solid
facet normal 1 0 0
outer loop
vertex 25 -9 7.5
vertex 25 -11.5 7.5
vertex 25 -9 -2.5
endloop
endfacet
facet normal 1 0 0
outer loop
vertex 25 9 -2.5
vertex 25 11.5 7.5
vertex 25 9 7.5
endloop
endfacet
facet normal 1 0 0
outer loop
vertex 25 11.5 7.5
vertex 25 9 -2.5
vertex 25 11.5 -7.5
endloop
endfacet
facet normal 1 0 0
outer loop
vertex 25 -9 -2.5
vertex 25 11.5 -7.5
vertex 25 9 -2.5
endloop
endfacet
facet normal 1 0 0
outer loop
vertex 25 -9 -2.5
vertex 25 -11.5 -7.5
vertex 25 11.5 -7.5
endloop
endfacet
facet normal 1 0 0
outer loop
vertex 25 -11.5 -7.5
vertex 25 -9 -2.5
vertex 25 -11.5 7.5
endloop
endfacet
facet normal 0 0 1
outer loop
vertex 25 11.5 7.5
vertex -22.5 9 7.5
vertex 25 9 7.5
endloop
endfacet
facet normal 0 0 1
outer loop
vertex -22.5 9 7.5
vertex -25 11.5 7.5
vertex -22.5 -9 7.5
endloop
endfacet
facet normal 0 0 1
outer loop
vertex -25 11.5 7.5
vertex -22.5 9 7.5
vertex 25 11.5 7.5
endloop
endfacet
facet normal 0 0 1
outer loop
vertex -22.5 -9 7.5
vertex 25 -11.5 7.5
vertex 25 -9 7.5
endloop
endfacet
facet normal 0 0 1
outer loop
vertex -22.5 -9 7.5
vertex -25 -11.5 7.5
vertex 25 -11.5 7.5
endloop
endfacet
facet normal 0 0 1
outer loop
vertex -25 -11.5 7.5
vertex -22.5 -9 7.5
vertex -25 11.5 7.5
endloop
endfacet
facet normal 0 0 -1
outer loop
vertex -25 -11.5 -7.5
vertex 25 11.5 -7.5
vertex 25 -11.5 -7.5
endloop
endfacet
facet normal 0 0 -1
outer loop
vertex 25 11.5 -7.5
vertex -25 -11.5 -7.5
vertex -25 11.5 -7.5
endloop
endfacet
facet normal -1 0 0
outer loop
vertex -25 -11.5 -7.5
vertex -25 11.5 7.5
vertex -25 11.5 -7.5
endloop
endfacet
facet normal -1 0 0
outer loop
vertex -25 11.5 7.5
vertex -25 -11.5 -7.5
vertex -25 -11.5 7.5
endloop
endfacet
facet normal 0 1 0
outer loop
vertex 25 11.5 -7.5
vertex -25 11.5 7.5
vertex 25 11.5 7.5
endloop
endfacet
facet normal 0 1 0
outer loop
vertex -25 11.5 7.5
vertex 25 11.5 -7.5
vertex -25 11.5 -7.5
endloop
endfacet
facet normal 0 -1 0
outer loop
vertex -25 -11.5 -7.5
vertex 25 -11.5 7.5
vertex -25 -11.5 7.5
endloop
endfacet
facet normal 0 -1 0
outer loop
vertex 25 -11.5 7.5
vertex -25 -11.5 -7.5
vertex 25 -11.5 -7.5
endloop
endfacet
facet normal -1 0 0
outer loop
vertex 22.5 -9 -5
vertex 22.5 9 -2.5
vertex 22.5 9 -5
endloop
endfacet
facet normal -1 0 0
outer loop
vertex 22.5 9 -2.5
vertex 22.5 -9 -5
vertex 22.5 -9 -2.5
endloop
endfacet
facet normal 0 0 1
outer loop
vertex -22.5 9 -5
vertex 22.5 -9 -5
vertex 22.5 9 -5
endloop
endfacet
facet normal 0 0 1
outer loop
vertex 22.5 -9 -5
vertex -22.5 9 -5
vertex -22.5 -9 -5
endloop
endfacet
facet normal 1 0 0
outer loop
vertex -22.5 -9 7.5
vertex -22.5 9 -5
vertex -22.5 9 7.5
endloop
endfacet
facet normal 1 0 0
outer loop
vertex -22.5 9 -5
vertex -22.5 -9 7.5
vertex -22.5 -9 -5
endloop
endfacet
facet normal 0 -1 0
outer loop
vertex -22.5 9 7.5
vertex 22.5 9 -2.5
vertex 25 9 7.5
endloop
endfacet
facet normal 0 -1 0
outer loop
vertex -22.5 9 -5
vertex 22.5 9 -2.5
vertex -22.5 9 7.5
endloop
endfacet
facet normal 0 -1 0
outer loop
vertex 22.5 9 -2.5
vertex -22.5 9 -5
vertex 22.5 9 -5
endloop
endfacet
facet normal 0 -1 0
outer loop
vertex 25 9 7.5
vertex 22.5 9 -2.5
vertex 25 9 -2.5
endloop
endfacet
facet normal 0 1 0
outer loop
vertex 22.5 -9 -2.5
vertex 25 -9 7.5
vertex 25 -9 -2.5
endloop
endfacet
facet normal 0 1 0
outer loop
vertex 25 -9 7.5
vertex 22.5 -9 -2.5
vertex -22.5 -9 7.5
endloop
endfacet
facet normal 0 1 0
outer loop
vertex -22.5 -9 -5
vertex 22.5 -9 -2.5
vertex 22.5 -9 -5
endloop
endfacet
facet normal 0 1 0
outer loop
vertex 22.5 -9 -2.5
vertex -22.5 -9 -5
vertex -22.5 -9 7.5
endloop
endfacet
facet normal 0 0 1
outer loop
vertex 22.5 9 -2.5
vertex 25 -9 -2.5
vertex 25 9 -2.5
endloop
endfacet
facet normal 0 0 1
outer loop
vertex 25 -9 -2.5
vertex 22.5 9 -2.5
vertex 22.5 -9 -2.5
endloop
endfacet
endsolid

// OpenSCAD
l = 45;
w = 18;
h = 10;
border = 5;

difference(){
    cube([l+border,w+border,h+border],true);
    translate([0,0,border/2])
    cube([l,w,h+border],true);
    translate([border,0,border])
    cube([l,w,h+border],true);
}
